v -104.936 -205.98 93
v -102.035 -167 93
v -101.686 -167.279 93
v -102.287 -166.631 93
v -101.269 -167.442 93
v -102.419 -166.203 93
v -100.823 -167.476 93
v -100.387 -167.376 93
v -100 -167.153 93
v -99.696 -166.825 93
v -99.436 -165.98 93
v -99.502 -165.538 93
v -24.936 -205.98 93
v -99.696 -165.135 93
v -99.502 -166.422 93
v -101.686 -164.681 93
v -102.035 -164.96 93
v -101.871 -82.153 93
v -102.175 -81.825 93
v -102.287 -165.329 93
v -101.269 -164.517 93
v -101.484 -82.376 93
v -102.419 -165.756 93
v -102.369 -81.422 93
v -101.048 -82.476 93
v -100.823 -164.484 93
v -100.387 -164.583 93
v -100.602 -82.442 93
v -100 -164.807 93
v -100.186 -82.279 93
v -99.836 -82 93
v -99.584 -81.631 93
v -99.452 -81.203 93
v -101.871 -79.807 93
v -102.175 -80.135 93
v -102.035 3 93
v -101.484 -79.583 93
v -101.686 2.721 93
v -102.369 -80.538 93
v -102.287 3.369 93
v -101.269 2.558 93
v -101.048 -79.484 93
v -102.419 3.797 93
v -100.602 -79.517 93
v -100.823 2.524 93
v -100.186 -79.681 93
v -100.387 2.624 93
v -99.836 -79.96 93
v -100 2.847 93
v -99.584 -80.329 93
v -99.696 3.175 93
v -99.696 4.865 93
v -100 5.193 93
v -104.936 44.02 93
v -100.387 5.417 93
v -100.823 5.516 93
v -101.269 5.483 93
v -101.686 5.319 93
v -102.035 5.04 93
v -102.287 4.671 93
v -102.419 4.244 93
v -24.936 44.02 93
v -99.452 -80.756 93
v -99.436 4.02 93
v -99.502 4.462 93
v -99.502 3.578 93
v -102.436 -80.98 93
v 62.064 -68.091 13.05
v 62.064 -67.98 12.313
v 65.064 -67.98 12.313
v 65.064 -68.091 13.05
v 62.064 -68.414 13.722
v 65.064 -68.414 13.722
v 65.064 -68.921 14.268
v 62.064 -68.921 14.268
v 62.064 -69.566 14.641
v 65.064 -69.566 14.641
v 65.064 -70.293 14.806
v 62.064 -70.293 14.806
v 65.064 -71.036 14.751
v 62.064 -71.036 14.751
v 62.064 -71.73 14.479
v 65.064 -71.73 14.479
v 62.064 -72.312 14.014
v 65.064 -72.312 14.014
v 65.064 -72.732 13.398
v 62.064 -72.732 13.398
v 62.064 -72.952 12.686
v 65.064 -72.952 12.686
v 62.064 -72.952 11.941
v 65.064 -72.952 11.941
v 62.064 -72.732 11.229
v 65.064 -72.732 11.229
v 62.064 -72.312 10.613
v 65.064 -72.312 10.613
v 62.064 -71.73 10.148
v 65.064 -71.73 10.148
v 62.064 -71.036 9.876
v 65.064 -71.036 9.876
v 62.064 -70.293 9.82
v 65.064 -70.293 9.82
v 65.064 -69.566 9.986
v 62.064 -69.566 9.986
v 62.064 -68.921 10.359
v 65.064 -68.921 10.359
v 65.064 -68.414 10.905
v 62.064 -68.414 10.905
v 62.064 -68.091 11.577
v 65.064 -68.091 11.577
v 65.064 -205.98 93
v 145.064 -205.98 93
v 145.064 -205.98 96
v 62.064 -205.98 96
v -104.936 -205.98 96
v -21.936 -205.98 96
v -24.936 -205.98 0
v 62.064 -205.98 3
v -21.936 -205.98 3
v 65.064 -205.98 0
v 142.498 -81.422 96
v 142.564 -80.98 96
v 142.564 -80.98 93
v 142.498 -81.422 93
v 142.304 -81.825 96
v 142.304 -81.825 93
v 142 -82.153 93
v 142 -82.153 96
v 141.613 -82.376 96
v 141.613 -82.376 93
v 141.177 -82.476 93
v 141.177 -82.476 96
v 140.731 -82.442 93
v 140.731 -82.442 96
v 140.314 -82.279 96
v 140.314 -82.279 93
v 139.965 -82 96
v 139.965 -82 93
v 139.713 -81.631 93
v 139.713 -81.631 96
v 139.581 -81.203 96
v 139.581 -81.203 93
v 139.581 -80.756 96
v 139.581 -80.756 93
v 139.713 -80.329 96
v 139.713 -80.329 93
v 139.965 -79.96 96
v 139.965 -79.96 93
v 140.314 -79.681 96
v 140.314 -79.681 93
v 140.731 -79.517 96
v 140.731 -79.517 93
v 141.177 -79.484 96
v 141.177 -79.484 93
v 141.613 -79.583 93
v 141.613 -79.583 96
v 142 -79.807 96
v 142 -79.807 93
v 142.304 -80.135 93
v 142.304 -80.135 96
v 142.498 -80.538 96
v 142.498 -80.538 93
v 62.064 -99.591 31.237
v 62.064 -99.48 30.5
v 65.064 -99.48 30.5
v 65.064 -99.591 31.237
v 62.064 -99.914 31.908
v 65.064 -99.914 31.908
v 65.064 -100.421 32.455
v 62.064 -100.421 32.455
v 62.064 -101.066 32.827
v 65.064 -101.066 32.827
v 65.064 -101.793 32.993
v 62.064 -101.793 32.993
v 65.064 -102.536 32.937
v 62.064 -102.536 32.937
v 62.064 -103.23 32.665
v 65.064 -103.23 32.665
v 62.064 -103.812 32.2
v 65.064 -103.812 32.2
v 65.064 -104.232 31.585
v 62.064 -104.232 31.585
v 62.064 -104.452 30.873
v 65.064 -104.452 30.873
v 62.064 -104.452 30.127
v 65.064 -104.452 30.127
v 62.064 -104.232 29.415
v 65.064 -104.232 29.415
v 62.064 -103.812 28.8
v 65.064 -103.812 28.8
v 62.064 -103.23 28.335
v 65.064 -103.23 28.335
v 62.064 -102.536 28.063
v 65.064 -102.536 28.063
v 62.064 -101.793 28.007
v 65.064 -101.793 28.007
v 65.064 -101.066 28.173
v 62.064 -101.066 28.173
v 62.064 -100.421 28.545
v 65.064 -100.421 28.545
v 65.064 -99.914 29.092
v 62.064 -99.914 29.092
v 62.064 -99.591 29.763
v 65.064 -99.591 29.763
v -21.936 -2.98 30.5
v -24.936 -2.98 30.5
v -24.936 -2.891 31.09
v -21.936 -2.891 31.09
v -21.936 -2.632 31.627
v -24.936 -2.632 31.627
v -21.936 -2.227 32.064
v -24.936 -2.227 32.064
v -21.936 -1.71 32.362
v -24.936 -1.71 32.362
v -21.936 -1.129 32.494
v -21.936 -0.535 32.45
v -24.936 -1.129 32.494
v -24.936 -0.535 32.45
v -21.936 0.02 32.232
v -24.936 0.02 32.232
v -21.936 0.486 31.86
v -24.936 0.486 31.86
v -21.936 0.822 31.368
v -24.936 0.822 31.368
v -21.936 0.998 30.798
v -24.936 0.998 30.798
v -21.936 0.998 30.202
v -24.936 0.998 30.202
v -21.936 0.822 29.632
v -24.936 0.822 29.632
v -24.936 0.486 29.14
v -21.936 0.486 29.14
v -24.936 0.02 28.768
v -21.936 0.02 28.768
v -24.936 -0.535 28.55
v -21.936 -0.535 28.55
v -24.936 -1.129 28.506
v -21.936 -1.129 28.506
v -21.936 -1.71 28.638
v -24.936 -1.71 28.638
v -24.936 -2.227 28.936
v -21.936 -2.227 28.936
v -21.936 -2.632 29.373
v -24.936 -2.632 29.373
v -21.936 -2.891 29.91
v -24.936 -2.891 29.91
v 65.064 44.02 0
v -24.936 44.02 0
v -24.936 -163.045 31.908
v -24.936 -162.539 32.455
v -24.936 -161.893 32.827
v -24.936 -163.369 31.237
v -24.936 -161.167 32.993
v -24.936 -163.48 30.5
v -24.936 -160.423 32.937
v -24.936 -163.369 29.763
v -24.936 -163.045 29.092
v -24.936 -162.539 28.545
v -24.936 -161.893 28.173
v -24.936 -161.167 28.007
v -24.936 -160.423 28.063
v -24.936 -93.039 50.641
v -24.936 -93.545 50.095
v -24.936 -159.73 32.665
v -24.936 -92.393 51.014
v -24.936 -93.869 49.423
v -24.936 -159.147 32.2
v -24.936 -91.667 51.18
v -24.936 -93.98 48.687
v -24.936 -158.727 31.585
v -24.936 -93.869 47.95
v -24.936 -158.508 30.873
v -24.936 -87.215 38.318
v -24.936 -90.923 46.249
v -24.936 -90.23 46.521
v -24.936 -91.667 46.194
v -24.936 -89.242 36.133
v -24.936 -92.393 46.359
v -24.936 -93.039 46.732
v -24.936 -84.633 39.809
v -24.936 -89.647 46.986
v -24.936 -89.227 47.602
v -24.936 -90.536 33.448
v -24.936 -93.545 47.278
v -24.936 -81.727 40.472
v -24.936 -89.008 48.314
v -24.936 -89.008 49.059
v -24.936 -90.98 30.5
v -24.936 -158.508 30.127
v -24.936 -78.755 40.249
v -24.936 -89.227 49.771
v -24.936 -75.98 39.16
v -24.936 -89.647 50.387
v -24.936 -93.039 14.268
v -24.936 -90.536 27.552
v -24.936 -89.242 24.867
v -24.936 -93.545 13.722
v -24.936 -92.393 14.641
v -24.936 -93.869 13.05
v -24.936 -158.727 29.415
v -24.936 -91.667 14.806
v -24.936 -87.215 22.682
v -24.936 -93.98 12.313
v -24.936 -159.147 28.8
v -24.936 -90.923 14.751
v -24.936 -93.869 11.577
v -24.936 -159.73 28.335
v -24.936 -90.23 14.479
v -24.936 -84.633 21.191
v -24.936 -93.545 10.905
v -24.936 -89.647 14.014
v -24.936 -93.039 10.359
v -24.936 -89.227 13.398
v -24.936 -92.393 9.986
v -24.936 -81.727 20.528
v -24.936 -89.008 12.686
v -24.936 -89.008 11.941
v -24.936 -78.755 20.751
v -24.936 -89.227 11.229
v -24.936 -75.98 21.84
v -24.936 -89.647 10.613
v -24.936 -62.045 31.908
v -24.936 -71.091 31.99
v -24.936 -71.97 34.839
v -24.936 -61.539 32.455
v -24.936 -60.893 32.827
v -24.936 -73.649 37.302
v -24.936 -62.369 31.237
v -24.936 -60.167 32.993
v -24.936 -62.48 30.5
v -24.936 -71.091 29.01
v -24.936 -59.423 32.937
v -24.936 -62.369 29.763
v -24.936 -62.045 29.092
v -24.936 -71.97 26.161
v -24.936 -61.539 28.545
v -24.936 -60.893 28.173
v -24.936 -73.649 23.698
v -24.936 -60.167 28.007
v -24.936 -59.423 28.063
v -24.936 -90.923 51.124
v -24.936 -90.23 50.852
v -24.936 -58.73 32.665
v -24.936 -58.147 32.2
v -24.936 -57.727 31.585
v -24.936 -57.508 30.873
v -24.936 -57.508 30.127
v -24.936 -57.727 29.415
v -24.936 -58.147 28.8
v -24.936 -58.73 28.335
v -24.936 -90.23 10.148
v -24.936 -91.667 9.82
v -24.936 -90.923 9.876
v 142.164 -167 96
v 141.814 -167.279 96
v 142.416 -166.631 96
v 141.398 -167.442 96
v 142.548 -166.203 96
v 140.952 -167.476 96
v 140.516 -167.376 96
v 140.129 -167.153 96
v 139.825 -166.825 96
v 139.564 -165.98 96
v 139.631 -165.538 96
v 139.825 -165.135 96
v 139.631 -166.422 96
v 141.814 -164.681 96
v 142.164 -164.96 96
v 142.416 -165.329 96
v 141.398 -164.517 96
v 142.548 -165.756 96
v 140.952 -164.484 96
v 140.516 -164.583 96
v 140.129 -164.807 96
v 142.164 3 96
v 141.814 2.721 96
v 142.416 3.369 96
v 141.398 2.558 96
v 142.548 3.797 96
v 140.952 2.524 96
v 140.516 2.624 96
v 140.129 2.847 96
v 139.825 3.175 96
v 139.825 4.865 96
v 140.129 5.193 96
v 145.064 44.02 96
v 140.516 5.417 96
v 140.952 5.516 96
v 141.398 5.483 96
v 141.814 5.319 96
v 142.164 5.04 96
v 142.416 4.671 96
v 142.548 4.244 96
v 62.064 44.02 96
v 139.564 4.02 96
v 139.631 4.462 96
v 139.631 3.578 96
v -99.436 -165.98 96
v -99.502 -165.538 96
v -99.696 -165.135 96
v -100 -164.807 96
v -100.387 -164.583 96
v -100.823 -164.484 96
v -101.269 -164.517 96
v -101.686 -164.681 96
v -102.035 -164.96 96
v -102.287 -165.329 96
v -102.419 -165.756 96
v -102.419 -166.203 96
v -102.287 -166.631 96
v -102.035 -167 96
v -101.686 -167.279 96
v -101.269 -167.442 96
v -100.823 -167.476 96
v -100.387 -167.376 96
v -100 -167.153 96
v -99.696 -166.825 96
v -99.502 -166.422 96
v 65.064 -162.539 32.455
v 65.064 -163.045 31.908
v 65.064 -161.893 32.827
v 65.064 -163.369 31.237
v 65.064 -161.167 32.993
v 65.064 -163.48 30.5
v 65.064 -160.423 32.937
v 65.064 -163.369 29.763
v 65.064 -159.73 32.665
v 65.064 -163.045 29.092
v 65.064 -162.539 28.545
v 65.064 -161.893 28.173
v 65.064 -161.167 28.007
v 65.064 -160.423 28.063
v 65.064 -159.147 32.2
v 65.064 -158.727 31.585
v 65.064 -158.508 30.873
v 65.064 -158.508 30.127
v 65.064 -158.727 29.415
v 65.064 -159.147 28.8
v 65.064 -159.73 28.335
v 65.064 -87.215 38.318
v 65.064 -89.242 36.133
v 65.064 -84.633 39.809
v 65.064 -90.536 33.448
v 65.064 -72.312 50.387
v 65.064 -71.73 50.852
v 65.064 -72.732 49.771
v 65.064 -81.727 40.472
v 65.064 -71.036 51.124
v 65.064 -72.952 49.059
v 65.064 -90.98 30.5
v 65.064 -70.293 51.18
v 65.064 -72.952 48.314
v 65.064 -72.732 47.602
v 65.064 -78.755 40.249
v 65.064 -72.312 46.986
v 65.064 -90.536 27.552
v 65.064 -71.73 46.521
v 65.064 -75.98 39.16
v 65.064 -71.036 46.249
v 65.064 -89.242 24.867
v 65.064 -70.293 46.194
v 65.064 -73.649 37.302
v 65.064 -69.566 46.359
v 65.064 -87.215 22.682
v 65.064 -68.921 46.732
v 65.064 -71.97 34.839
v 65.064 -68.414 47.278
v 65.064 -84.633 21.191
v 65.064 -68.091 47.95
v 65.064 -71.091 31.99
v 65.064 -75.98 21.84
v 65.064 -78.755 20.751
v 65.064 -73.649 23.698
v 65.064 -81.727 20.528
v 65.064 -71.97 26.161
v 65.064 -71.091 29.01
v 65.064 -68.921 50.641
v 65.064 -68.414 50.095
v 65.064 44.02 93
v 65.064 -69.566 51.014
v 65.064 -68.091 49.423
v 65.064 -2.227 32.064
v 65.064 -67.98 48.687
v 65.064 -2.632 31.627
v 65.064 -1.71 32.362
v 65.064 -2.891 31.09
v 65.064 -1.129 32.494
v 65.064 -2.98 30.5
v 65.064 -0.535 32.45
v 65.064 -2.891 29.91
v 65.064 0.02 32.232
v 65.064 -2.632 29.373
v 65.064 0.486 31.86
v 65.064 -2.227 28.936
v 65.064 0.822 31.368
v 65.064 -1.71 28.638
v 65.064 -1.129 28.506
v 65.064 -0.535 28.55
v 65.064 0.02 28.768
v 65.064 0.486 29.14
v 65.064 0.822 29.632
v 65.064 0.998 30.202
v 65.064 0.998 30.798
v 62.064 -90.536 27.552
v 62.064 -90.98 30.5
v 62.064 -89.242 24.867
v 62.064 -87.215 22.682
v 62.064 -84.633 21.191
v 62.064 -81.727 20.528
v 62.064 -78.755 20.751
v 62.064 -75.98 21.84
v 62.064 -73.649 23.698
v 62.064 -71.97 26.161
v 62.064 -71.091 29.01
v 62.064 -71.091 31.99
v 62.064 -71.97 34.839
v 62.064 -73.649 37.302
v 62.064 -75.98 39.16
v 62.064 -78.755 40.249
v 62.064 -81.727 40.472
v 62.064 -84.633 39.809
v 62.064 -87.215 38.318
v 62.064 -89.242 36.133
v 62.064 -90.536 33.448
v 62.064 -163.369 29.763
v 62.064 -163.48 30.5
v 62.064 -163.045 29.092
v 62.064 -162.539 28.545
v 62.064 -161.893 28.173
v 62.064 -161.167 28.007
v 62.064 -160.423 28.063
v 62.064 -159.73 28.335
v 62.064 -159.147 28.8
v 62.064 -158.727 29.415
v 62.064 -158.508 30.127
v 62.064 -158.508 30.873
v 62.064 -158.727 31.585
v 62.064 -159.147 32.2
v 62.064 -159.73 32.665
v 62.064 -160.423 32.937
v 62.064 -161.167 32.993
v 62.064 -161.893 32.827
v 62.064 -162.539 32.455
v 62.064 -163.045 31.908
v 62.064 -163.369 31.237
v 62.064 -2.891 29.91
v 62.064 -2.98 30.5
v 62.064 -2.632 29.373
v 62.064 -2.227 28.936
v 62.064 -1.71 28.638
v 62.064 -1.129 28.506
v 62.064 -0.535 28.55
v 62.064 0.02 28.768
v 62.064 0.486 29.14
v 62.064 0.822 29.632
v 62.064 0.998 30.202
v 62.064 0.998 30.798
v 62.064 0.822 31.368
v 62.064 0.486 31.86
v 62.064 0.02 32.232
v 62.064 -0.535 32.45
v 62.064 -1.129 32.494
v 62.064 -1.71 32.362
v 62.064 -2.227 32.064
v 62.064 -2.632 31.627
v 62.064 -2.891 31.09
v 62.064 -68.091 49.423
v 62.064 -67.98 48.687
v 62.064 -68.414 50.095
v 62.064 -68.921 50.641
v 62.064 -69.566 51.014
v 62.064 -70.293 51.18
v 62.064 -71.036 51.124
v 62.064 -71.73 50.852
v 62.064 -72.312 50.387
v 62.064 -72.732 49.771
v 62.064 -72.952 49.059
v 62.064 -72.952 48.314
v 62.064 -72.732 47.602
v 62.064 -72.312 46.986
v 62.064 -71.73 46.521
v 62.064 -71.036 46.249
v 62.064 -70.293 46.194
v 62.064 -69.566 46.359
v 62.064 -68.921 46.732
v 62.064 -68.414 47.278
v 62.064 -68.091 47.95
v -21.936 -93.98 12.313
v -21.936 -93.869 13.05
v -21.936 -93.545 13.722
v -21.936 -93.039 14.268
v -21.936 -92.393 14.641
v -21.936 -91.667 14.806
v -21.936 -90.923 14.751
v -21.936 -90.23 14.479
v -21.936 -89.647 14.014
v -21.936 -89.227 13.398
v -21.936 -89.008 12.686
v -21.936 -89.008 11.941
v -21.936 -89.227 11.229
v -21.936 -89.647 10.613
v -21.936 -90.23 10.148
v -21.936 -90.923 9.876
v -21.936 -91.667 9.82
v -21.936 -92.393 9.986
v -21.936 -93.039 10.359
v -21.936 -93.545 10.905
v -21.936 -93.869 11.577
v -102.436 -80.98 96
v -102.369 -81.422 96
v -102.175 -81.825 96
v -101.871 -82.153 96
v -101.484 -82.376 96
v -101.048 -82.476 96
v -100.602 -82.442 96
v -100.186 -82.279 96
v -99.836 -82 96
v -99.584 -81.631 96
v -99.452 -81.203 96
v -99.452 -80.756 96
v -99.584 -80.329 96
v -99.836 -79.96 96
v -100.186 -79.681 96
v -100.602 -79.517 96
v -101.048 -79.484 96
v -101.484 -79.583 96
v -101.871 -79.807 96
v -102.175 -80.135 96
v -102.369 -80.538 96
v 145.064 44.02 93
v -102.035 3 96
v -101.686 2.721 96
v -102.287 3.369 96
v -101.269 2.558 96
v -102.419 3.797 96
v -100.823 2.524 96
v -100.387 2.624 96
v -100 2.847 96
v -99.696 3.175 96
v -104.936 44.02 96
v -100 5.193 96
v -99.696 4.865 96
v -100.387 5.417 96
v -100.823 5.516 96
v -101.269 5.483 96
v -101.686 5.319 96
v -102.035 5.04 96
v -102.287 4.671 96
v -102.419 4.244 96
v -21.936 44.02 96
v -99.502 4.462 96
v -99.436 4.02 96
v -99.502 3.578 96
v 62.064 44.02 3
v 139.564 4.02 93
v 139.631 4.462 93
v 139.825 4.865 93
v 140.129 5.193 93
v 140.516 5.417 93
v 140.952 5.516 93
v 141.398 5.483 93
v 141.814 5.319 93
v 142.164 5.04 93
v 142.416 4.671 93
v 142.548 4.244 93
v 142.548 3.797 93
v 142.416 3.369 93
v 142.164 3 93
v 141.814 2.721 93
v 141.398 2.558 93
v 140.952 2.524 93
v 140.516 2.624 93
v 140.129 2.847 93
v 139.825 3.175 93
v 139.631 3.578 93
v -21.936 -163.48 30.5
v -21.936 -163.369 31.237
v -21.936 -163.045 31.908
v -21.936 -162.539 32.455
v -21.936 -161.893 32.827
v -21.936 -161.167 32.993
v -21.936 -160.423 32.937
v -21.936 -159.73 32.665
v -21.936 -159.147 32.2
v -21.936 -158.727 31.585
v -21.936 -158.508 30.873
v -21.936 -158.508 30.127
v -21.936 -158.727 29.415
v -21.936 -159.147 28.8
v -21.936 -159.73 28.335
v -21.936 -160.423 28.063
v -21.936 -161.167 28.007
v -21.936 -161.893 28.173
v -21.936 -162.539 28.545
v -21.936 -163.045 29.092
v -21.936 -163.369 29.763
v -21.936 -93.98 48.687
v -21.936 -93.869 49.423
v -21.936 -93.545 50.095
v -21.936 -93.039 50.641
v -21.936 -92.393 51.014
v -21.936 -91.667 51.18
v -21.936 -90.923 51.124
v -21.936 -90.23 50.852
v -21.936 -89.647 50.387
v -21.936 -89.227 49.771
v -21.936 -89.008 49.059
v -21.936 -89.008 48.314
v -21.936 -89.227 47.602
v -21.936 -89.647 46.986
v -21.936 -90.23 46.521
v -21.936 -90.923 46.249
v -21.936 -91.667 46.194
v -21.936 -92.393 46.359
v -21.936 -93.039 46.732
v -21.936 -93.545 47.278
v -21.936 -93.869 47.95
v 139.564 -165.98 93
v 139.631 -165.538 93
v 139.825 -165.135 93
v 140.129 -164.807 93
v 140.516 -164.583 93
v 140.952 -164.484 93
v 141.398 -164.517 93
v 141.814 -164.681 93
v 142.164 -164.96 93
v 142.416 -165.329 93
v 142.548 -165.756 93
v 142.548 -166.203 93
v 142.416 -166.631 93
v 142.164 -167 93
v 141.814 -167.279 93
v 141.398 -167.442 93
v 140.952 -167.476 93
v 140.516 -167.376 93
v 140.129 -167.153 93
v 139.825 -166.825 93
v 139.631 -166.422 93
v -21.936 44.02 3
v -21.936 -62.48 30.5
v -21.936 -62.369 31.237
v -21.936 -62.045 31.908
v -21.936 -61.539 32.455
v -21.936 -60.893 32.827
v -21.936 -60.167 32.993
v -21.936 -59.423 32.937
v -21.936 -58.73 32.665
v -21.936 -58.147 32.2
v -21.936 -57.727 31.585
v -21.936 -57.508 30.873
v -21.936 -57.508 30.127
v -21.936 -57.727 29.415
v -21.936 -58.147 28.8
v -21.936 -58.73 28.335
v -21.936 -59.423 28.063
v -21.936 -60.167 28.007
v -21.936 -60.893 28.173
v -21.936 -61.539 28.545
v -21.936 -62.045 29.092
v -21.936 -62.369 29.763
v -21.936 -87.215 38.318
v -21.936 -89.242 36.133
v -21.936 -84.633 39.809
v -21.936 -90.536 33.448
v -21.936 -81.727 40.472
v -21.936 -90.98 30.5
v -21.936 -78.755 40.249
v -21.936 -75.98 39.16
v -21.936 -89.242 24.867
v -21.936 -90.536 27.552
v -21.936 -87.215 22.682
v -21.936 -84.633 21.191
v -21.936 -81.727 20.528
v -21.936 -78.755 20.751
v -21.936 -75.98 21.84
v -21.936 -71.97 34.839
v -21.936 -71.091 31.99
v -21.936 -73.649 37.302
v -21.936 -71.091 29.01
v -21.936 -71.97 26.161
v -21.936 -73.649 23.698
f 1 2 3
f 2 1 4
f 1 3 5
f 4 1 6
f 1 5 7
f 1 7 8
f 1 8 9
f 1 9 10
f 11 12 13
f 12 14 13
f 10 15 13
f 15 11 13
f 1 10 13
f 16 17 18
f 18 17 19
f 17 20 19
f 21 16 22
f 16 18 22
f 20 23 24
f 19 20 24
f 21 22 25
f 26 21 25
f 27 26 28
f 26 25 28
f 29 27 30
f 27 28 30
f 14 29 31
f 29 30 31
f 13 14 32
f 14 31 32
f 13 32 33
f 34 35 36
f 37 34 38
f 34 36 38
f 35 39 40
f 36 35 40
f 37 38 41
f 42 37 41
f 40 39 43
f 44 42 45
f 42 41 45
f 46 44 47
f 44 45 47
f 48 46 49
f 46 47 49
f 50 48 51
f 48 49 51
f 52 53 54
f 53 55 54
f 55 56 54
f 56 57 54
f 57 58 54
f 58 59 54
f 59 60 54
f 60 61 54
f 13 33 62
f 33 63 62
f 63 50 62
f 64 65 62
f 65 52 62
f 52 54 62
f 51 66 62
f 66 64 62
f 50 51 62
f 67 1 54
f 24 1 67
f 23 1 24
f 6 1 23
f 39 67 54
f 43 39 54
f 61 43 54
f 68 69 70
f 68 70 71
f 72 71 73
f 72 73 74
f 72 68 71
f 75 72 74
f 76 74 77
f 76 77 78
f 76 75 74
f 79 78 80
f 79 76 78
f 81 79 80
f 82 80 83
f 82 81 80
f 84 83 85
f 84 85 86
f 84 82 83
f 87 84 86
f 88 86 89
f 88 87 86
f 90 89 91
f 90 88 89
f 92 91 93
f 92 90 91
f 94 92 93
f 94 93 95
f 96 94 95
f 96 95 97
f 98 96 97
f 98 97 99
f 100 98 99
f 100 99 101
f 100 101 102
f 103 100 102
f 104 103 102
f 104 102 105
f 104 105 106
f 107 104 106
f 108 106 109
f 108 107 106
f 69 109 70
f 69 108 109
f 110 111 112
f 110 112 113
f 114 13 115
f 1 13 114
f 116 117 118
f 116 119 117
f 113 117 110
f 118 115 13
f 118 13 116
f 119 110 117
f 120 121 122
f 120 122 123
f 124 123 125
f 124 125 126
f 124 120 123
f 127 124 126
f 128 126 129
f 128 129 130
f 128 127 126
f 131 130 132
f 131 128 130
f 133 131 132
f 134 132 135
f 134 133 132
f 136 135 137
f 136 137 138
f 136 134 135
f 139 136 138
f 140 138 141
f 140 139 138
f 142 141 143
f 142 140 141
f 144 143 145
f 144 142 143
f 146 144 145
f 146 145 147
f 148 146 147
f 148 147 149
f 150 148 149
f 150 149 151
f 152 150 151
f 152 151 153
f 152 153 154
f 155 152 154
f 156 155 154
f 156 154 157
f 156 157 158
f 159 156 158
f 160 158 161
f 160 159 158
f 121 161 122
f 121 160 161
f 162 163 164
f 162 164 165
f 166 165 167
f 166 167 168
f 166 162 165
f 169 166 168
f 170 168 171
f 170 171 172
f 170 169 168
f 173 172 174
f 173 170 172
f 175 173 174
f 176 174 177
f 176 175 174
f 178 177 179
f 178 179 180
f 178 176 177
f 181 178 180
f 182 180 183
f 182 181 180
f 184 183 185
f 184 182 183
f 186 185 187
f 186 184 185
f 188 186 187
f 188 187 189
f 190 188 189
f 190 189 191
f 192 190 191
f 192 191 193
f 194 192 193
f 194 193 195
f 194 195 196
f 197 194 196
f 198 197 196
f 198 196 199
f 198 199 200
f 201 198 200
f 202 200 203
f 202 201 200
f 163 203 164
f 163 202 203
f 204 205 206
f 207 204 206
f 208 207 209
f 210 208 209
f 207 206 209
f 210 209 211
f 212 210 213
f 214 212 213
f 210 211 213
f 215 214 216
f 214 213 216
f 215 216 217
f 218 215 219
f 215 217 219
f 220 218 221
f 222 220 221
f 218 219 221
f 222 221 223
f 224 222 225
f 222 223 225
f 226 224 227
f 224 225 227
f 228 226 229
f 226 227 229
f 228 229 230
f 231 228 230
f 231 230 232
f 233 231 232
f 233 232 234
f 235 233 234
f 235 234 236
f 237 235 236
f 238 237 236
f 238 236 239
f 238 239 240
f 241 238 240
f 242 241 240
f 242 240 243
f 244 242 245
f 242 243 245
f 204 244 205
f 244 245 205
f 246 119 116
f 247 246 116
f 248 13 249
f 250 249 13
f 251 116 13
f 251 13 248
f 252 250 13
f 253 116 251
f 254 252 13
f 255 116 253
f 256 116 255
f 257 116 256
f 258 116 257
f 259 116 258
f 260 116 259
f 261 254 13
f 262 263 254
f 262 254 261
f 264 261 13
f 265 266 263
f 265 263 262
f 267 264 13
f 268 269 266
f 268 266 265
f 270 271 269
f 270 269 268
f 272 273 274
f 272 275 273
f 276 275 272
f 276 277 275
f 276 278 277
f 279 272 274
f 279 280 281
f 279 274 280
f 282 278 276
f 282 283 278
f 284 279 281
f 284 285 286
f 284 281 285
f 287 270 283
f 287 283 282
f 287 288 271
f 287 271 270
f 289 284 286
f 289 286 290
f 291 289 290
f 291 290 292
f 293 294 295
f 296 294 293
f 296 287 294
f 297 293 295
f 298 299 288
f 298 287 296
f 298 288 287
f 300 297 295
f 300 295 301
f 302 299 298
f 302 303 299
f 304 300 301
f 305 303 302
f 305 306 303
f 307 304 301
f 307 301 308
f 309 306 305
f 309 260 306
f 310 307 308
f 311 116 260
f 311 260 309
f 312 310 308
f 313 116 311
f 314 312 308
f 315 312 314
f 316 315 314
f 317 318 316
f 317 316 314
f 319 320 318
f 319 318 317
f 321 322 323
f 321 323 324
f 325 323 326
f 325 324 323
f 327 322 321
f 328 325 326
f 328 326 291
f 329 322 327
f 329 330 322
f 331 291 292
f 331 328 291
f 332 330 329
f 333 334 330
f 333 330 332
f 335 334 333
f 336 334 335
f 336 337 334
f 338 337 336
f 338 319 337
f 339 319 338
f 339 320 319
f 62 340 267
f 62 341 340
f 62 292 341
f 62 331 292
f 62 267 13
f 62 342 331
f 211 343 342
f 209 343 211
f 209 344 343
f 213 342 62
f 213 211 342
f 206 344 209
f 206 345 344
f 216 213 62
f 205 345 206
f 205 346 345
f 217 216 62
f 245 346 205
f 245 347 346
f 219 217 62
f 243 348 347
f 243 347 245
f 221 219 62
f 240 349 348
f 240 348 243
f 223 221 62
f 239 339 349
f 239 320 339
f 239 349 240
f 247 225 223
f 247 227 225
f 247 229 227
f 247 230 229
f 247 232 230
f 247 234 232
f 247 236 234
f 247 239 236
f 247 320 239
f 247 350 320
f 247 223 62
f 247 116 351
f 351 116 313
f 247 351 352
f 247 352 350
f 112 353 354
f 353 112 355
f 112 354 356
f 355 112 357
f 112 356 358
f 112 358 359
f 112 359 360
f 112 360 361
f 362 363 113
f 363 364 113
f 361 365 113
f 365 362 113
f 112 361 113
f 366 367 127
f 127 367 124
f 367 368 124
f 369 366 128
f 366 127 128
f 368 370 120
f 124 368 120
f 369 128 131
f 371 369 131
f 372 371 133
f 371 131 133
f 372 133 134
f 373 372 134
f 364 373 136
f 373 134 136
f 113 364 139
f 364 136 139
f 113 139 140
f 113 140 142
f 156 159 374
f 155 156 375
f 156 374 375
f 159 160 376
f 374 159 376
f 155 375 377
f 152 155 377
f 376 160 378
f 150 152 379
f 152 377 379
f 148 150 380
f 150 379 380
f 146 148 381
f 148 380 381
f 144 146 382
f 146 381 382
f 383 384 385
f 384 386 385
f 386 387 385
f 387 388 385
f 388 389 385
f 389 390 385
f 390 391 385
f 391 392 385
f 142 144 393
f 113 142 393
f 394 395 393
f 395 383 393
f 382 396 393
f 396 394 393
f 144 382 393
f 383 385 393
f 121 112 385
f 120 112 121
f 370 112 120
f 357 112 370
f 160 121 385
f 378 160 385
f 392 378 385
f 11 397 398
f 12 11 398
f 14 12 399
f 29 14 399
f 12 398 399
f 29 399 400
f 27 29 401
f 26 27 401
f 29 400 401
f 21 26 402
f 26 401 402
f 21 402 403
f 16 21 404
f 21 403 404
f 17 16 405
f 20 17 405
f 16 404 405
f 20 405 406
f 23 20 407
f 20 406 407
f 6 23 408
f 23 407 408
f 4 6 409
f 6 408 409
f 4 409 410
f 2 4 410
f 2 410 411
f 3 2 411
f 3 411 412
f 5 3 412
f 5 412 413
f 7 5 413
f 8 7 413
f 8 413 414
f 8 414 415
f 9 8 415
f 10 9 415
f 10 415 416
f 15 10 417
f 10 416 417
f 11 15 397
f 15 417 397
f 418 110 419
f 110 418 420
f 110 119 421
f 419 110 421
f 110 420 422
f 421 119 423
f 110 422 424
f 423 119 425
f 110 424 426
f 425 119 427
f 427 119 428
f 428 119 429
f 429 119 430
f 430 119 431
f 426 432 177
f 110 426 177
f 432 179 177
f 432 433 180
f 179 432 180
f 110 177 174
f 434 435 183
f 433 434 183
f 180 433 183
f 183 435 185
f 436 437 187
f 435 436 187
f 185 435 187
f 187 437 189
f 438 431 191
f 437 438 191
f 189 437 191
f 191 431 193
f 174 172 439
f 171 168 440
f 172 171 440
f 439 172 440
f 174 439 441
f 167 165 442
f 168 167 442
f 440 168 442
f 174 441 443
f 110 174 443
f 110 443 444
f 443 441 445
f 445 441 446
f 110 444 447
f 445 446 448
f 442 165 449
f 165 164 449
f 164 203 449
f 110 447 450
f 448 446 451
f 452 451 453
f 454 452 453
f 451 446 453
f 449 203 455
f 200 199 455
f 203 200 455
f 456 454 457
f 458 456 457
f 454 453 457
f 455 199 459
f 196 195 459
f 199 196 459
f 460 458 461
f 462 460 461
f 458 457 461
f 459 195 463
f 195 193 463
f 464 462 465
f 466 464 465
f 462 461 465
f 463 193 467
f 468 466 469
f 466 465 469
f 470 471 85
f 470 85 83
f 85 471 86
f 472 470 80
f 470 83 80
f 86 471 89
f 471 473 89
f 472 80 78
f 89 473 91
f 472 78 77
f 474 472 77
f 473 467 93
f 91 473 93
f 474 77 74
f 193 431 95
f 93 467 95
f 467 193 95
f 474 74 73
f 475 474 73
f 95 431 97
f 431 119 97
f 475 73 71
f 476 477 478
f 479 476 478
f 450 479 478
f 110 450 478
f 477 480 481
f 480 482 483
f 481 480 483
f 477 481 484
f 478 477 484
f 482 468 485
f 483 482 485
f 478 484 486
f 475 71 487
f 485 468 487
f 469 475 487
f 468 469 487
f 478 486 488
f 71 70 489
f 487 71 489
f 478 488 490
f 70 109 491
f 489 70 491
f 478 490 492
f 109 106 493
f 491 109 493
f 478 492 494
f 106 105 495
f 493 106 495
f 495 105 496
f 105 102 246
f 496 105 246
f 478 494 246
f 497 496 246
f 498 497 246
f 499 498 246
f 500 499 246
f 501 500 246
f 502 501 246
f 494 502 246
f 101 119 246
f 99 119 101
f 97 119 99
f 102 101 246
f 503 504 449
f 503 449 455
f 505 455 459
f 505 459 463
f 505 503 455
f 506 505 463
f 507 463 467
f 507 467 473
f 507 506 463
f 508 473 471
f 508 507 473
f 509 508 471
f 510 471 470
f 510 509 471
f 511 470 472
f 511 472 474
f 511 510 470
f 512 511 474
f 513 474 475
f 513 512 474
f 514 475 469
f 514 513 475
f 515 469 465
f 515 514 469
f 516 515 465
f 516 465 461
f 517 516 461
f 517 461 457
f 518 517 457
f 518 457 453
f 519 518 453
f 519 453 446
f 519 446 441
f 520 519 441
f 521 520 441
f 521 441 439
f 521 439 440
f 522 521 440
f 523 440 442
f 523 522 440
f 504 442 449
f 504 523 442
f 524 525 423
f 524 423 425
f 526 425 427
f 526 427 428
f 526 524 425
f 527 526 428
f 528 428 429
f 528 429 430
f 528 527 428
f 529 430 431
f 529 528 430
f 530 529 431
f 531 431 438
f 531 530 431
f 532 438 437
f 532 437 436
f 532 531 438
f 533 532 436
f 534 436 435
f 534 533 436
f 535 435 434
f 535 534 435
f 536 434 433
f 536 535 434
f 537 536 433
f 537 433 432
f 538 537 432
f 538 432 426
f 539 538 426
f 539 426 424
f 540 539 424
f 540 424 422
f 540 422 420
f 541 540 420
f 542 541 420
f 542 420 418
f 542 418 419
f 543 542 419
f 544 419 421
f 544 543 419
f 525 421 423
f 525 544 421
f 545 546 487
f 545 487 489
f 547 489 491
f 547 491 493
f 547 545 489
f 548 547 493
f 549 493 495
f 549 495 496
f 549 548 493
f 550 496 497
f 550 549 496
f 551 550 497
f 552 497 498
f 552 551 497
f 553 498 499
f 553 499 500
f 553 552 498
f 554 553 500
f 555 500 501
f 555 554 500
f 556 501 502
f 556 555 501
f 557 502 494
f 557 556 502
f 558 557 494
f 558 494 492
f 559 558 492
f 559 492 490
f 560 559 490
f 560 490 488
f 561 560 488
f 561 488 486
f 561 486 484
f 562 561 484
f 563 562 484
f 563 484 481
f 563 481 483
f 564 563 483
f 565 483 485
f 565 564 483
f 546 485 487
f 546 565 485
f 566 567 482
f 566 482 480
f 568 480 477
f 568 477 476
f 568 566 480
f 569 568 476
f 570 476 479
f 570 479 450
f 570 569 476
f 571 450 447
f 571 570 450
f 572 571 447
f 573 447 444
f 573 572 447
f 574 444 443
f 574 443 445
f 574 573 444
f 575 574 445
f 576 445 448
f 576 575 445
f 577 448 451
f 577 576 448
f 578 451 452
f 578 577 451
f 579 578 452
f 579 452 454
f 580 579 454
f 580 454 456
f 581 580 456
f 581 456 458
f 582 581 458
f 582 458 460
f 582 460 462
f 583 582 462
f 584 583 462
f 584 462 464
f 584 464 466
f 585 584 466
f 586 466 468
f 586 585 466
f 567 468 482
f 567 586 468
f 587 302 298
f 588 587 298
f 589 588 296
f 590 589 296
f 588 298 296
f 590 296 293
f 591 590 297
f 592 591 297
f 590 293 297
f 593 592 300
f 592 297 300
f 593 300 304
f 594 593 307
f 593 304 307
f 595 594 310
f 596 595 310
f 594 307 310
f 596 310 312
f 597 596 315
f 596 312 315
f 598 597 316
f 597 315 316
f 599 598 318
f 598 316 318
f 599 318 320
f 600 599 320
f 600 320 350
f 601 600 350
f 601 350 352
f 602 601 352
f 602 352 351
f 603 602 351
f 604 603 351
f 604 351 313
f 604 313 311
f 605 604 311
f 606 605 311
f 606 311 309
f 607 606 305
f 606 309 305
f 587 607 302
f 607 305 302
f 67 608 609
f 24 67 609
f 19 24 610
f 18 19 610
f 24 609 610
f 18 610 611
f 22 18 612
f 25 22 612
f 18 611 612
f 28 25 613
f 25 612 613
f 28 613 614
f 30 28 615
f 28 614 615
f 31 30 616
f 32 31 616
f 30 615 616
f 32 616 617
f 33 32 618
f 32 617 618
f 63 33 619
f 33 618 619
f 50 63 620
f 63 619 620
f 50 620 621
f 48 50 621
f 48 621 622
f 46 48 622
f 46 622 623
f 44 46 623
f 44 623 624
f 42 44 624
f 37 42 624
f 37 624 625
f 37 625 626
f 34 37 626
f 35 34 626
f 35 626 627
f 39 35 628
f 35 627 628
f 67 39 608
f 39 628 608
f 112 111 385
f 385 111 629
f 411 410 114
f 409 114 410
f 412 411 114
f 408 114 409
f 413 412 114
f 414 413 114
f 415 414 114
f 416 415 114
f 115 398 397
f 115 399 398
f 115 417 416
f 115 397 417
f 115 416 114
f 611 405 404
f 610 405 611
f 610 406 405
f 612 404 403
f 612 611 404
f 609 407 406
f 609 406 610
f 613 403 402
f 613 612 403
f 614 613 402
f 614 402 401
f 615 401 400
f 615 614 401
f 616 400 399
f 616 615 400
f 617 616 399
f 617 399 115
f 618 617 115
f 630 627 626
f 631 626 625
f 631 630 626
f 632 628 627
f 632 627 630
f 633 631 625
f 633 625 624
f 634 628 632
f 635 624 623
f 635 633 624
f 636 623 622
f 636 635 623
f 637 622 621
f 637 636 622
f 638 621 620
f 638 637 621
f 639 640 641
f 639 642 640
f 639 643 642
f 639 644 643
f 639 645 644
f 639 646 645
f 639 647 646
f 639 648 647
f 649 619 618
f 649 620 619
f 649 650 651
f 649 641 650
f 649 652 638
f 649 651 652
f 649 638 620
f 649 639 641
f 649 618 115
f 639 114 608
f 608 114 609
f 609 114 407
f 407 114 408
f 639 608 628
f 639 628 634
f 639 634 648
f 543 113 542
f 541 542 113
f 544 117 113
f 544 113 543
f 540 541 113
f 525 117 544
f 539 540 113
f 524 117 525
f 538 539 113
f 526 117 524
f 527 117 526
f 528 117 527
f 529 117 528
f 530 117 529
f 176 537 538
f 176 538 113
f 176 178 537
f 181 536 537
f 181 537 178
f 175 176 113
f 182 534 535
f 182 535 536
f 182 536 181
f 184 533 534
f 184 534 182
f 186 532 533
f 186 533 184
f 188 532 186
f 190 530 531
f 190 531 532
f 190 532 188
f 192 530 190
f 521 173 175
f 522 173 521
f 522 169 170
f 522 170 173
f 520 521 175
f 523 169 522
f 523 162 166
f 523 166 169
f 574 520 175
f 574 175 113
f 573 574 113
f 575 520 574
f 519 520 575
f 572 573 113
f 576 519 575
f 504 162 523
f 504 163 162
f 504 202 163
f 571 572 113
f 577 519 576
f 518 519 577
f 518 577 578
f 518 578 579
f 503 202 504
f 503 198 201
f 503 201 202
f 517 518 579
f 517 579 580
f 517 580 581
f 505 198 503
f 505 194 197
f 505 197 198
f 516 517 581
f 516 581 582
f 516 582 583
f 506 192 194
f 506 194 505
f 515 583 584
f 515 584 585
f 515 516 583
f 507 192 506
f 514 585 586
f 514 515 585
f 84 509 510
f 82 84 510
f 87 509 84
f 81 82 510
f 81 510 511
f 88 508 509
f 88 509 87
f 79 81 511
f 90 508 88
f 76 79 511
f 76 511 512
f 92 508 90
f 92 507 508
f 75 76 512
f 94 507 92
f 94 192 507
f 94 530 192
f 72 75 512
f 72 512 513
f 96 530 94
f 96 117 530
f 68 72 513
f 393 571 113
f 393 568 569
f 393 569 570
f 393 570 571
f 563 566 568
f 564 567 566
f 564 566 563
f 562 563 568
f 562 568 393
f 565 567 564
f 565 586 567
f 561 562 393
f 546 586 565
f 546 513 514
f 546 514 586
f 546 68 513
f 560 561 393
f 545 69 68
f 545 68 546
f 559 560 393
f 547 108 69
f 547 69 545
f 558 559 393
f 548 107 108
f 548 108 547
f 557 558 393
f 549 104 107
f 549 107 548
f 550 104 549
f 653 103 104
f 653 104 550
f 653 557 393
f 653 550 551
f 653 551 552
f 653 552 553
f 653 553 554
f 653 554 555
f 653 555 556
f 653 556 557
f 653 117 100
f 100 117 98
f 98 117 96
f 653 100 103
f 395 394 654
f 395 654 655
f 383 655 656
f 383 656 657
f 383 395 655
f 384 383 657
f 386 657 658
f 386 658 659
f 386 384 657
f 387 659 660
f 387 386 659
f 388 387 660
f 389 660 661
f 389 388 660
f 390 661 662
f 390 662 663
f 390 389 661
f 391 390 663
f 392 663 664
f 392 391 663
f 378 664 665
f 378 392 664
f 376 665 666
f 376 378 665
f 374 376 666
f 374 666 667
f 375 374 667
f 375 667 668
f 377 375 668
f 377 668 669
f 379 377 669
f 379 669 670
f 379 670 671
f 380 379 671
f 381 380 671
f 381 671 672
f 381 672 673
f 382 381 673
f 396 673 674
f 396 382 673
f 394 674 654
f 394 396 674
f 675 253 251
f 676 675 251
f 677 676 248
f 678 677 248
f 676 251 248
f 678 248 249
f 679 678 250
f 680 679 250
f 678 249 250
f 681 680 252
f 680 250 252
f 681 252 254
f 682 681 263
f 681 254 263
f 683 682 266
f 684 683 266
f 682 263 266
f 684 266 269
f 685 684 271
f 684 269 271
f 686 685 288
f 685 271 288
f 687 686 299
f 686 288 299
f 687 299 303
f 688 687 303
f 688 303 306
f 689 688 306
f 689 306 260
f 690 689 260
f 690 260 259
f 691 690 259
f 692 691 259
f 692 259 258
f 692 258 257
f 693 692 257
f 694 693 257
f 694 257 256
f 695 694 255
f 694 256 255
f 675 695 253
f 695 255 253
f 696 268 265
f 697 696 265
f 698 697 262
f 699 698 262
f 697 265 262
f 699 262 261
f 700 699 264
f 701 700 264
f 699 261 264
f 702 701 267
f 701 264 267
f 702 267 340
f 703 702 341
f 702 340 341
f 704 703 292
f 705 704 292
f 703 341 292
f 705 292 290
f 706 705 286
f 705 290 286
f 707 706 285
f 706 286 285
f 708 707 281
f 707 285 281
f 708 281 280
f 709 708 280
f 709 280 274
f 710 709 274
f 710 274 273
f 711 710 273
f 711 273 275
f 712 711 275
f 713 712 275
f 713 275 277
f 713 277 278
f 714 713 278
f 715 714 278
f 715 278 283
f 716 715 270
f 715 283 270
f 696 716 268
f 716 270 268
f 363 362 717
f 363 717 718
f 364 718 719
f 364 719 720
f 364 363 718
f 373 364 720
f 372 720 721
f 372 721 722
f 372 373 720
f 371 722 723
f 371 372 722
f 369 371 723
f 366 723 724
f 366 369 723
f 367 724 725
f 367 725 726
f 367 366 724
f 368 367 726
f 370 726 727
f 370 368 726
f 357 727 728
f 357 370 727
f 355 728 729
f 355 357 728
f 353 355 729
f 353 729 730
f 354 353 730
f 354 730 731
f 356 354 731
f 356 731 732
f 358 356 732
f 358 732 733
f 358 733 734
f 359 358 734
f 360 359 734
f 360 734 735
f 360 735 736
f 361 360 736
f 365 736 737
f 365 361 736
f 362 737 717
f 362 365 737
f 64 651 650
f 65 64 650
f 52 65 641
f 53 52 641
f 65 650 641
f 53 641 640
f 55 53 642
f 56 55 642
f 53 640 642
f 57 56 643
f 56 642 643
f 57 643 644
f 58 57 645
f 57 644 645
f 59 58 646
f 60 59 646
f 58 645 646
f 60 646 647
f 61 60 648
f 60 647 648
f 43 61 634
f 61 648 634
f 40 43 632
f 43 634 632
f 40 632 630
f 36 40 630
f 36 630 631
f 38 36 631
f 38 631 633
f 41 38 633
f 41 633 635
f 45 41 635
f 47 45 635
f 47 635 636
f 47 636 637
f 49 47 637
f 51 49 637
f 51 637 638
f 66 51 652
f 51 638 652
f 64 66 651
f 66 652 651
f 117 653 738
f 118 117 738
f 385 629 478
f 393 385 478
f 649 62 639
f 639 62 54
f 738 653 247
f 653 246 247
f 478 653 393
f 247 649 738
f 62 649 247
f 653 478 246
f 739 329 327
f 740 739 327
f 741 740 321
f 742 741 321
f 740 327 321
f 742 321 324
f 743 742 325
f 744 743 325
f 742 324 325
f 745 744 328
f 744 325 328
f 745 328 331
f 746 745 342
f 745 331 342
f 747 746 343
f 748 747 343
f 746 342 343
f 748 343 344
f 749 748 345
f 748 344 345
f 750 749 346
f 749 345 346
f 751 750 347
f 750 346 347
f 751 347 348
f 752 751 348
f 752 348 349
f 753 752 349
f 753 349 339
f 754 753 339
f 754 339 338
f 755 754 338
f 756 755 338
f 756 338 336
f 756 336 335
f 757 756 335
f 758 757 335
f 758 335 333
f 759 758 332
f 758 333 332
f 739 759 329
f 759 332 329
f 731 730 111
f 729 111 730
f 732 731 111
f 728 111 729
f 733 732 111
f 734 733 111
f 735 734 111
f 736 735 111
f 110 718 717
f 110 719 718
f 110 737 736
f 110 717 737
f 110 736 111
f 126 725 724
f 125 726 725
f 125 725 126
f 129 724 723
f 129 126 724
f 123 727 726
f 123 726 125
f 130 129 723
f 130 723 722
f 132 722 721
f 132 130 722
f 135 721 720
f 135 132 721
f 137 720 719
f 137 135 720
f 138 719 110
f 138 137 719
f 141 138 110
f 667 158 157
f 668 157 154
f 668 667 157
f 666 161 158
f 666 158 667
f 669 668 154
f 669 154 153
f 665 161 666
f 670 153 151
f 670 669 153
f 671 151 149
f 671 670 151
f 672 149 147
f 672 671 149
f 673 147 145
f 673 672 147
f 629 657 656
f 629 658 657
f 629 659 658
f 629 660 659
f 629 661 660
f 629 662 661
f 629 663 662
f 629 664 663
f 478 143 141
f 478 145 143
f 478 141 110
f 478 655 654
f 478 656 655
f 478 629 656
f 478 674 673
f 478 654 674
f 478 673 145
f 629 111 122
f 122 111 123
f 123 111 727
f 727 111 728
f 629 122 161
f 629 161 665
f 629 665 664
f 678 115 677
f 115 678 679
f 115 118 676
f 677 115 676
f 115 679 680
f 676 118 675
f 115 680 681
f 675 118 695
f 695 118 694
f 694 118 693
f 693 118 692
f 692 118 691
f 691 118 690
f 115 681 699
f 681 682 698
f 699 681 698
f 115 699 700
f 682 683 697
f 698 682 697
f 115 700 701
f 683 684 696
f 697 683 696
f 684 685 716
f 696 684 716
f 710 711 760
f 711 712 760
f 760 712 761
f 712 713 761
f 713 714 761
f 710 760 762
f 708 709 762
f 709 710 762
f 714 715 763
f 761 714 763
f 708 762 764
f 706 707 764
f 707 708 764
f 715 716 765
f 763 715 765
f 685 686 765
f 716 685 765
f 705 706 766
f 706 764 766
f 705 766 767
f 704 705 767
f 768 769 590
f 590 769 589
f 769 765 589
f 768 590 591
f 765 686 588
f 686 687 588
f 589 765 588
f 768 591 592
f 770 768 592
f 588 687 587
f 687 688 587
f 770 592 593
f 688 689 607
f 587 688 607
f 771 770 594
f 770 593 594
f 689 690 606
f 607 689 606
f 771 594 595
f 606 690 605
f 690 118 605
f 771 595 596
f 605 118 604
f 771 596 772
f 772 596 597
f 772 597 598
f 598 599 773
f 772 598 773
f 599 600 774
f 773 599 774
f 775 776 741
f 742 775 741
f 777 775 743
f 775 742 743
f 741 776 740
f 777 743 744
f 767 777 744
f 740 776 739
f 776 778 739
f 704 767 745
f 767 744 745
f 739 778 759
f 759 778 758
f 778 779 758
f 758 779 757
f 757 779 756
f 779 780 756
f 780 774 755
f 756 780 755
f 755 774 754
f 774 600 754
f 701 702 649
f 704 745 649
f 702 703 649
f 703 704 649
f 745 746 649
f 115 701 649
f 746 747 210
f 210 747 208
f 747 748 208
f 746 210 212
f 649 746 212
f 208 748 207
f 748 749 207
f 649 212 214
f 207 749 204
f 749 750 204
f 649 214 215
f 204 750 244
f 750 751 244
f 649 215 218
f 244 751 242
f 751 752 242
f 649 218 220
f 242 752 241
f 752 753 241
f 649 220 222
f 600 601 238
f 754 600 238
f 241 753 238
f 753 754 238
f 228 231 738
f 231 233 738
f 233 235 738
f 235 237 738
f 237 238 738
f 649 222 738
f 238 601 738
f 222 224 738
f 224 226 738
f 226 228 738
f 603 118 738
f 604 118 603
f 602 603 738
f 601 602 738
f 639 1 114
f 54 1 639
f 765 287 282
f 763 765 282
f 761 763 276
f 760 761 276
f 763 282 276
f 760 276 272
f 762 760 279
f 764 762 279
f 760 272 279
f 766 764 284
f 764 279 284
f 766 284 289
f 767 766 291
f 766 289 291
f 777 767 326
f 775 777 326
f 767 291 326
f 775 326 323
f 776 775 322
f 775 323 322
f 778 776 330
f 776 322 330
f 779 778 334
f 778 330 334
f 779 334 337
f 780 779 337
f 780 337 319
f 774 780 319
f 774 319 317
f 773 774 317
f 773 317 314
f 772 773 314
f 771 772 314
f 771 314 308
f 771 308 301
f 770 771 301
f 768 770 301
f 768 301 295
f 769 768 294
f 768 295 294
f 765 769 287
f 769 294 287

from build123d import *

# Parameters (mm, degrees)
ESQUISSE1_W             = 45
ESQUISSE1_H             = 250
BOSS_EXTRU_2_DEPTH      = 3
ESQUISSE2_W             = 3
ESQUISSE2_H             = 250
BOSS_EXTRU_3_DEPTH      = 90
ESQUISSE3_W             = 83
ESQUISSE3_H             = 250
BOSS_EXTRU_4_DEPTH      = 3
ESQUISSE4_R             = 10
ESQUISSE4_R_2           = 2.5
ESQUISSE4_R_3           = 2
ENL_V_MAT_EXTRU_1_DEPTH = 3
ESQUISSE5_R             = 1.5
ENL_V_MAT_EXTRU_2_DEPTH = 3
ENL_V_START             = -3
ESQUISSE6_R             = 10
ESQUISSE6_R_2           = 2
ESQUISSE6_R_3           = 2.5
ENL_V_MAT_EXTRU_3_DEPTH = 3


with BuildPart() as part:
    # Esquisse1 → Boss.-Extru.2 (new body)
    with BuildSketch(Plane.XY):
        with Locations((-2.435511103, -80.979780034)):
            Rectangle(ESQUISSE1_W, ESQUISSE1_H)
    boss_extru_2 = extrude(amount=BOSS_EXTRU_2_DEPTH)

    # Esquisse2 → Boss.-Extru.3 (add)
    with BuildSketch(Plane.XY.offset(3)):
        with Locations((-23.435511103, -80.979780034)):
            Rectangle(ESQUISSE2_W, ESQUISSE2_H)
    boss_extru_3 = extrude(amount=BOSS_EXTRU_3_DEPTH)

    # Esquisse3 → Boss.-Extru.4 (add)
    with BuildSketch(Plane.XY.offset(93)):
        with Locations((-63.435511103, -80.979780034)):
            Rectangle(ESQUISSE3_W, ESQUISSE3_H)
    boss_extru_4 = extrude(amount=BOSS_EXTRU_4_DEPTH)

    # Esquisse4 → Enlèv. mat.-Extru.1 (cut)
    with BuildSketch(Plane.ZY.offset(24.935511103)):
        with Locations((30.5, -80.979780034)):
            Circle(ESQUISSE4_R)
        with Locations((30.5, -59.979780034)):
            Circle(ESQUISSE4_R_2)
        with Locations((48.686533479, -91.479780034)):
            Circle(ESQUISSE4_R_2)
        with Locations((30.5, -0.979780034)):
            Circle(ESQUISSE4_R_3)
        with Locations((30.5, -160.979780034)):
            Circle(ESQUISSE4_R_2)
        with Locations((12.313466521, -91.479780034)):
            Circle(ESQUISSE4_R_2)
    extrude(amount=-ENL_V_MAT_EXTRU_1_DEPTH, mode=Mode.SUBTRACT)

    # Esquisse5 → Enlèv. mat.-Extru.2 (cut)
    with BuildSketch(Plane.XY.offset(96)):
        with Locations((-100.935511103, -80.979780034)):
            Circle(ESQUISSE5_R)
        with Locations((-100.935511103, 4.020219966)):
            Circle(ESQUISSE5_R)
        with Locations((-100.935511103, -165.979780034)):
            Circle(ESQUISSE5_R)
    enl_v_mat_extru_2 = extrude(amount=-ENL_V_MAT_EXTRU_2_DEPTH, mode=Mode.SUBTRACT)

    # Symétrie1: Boss.-Extru.2, Boss.-Extru.3, Boss.-Extru.4, Enlèv. mat.-Extru.2 across plane
    add(boss_extru_2.mirror(Plane(origin=(20.064488897, 44.020219966, 3), x_dir=(0, 0, 1), z_dir=(1, 0, 0))))
    add(boss_extru_3.mirror(Plane(origin=(20.064488897, 44.020219966, 3), x_dir=(0, 0, 1), z_dir=(1, 0, 0))))
    add(boss_extru_4.mirror(Plane(origin=(20.064488897, 44.020219966, 3), x_dir=(0, 0, 1), z_dir=(1, 0, 0))))
    add(enl_v_mat_extru_2.mirror(Plane(origin=(20.064488897, 44.020219966, 3), x_dir=(0, 0, 1), z_dir=(1, 0, 0))), mode=Mode.SUBTRACT)

    # Esquisse6 → Enlèv. mat.-Extru.3 (cut)
    with BuildSketch(Plane(origin=(65.064488897, 0, 0), x_dir=(0, 0, -1), z_dir=(1, 0, 0)).offset(ENL_V_START)):
        with Locations((-30.5, -80.979780034)):
            Circle(ESQUISSE6_R)
        with Locations((-30.5, -0.979780034)):
            Circle(ESQUISSE6_R_2)
        with Locations((-30.5, -160.979780034)):
            Circle(ESQUISSE6_R_3)
        with Locations((-30.5, -101.979780034)):
            Circle(ESQUISSE6_R_3)
        with Locations((-48.686533479, -70.479780034)):
            Circle(ESQUISSE6_R_3)
        with Locations((-12.313466521, -70.479780034)):
            Circle(ESQUISSE6_R_3)
    extrude(amount=ENL_V_MAT_EXTRU_3_DEPTH, mode=Mode.SUBTRACT)


solid = part.part
